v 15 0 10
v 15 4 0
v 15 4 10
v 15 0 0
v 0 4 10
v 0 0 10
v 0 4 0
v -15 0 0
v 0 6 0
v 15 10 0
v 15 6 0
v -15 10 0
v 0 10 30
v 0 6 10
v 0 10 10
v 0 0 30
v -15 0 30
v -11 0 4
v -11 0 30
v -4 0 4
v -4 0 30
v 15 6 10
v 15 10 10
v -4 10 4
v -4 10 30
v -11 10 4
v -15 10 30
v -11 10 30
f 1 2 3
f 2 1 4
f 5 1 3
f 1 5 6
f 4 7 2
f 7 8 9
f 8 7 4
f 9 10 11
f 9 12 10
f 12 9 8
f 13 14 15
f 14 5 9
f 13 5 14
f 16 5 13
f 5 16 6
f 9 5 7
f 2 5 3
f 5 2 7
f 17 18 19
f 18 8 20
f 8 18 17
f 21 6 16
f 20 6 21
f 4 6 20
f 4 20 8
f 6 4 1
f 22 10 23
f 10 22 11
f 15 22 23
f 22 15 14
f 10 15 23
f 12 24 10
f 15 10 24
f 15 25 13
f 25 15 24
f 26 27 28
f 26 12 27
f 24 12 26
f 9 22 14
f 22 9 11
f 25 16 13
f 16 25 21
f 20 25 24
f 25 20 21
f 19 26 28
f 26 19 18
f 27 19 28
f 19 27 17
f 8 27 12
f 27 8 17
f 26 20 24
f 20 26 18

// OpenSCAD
fente = 2;

hauteur = 10;
largeur = 15;
cableHauteur = 7;
epaisseur = 4;

union() {
    cube([largeur, epaisseur, hauteur]);
    translate([0, epaisseur + fente, 0]) cube([largeur, epaisseur, hauteur]);
    translate([-epaisseur, 0, 0]) cube([epaisseur,  epaisseur * 2 + fente, largeur * 2]);
    translate([-(2*epaisseur) - cableHauteur, 0, 0]) cube([epaisseur,  epaisseur * 2 + fente, largeur * 2]);    
    translate([-epaisseur - cableHauteur, 0, 0]) cube([cableHauteur, epaisseur * 2 + fente, epaisseur]);
}
